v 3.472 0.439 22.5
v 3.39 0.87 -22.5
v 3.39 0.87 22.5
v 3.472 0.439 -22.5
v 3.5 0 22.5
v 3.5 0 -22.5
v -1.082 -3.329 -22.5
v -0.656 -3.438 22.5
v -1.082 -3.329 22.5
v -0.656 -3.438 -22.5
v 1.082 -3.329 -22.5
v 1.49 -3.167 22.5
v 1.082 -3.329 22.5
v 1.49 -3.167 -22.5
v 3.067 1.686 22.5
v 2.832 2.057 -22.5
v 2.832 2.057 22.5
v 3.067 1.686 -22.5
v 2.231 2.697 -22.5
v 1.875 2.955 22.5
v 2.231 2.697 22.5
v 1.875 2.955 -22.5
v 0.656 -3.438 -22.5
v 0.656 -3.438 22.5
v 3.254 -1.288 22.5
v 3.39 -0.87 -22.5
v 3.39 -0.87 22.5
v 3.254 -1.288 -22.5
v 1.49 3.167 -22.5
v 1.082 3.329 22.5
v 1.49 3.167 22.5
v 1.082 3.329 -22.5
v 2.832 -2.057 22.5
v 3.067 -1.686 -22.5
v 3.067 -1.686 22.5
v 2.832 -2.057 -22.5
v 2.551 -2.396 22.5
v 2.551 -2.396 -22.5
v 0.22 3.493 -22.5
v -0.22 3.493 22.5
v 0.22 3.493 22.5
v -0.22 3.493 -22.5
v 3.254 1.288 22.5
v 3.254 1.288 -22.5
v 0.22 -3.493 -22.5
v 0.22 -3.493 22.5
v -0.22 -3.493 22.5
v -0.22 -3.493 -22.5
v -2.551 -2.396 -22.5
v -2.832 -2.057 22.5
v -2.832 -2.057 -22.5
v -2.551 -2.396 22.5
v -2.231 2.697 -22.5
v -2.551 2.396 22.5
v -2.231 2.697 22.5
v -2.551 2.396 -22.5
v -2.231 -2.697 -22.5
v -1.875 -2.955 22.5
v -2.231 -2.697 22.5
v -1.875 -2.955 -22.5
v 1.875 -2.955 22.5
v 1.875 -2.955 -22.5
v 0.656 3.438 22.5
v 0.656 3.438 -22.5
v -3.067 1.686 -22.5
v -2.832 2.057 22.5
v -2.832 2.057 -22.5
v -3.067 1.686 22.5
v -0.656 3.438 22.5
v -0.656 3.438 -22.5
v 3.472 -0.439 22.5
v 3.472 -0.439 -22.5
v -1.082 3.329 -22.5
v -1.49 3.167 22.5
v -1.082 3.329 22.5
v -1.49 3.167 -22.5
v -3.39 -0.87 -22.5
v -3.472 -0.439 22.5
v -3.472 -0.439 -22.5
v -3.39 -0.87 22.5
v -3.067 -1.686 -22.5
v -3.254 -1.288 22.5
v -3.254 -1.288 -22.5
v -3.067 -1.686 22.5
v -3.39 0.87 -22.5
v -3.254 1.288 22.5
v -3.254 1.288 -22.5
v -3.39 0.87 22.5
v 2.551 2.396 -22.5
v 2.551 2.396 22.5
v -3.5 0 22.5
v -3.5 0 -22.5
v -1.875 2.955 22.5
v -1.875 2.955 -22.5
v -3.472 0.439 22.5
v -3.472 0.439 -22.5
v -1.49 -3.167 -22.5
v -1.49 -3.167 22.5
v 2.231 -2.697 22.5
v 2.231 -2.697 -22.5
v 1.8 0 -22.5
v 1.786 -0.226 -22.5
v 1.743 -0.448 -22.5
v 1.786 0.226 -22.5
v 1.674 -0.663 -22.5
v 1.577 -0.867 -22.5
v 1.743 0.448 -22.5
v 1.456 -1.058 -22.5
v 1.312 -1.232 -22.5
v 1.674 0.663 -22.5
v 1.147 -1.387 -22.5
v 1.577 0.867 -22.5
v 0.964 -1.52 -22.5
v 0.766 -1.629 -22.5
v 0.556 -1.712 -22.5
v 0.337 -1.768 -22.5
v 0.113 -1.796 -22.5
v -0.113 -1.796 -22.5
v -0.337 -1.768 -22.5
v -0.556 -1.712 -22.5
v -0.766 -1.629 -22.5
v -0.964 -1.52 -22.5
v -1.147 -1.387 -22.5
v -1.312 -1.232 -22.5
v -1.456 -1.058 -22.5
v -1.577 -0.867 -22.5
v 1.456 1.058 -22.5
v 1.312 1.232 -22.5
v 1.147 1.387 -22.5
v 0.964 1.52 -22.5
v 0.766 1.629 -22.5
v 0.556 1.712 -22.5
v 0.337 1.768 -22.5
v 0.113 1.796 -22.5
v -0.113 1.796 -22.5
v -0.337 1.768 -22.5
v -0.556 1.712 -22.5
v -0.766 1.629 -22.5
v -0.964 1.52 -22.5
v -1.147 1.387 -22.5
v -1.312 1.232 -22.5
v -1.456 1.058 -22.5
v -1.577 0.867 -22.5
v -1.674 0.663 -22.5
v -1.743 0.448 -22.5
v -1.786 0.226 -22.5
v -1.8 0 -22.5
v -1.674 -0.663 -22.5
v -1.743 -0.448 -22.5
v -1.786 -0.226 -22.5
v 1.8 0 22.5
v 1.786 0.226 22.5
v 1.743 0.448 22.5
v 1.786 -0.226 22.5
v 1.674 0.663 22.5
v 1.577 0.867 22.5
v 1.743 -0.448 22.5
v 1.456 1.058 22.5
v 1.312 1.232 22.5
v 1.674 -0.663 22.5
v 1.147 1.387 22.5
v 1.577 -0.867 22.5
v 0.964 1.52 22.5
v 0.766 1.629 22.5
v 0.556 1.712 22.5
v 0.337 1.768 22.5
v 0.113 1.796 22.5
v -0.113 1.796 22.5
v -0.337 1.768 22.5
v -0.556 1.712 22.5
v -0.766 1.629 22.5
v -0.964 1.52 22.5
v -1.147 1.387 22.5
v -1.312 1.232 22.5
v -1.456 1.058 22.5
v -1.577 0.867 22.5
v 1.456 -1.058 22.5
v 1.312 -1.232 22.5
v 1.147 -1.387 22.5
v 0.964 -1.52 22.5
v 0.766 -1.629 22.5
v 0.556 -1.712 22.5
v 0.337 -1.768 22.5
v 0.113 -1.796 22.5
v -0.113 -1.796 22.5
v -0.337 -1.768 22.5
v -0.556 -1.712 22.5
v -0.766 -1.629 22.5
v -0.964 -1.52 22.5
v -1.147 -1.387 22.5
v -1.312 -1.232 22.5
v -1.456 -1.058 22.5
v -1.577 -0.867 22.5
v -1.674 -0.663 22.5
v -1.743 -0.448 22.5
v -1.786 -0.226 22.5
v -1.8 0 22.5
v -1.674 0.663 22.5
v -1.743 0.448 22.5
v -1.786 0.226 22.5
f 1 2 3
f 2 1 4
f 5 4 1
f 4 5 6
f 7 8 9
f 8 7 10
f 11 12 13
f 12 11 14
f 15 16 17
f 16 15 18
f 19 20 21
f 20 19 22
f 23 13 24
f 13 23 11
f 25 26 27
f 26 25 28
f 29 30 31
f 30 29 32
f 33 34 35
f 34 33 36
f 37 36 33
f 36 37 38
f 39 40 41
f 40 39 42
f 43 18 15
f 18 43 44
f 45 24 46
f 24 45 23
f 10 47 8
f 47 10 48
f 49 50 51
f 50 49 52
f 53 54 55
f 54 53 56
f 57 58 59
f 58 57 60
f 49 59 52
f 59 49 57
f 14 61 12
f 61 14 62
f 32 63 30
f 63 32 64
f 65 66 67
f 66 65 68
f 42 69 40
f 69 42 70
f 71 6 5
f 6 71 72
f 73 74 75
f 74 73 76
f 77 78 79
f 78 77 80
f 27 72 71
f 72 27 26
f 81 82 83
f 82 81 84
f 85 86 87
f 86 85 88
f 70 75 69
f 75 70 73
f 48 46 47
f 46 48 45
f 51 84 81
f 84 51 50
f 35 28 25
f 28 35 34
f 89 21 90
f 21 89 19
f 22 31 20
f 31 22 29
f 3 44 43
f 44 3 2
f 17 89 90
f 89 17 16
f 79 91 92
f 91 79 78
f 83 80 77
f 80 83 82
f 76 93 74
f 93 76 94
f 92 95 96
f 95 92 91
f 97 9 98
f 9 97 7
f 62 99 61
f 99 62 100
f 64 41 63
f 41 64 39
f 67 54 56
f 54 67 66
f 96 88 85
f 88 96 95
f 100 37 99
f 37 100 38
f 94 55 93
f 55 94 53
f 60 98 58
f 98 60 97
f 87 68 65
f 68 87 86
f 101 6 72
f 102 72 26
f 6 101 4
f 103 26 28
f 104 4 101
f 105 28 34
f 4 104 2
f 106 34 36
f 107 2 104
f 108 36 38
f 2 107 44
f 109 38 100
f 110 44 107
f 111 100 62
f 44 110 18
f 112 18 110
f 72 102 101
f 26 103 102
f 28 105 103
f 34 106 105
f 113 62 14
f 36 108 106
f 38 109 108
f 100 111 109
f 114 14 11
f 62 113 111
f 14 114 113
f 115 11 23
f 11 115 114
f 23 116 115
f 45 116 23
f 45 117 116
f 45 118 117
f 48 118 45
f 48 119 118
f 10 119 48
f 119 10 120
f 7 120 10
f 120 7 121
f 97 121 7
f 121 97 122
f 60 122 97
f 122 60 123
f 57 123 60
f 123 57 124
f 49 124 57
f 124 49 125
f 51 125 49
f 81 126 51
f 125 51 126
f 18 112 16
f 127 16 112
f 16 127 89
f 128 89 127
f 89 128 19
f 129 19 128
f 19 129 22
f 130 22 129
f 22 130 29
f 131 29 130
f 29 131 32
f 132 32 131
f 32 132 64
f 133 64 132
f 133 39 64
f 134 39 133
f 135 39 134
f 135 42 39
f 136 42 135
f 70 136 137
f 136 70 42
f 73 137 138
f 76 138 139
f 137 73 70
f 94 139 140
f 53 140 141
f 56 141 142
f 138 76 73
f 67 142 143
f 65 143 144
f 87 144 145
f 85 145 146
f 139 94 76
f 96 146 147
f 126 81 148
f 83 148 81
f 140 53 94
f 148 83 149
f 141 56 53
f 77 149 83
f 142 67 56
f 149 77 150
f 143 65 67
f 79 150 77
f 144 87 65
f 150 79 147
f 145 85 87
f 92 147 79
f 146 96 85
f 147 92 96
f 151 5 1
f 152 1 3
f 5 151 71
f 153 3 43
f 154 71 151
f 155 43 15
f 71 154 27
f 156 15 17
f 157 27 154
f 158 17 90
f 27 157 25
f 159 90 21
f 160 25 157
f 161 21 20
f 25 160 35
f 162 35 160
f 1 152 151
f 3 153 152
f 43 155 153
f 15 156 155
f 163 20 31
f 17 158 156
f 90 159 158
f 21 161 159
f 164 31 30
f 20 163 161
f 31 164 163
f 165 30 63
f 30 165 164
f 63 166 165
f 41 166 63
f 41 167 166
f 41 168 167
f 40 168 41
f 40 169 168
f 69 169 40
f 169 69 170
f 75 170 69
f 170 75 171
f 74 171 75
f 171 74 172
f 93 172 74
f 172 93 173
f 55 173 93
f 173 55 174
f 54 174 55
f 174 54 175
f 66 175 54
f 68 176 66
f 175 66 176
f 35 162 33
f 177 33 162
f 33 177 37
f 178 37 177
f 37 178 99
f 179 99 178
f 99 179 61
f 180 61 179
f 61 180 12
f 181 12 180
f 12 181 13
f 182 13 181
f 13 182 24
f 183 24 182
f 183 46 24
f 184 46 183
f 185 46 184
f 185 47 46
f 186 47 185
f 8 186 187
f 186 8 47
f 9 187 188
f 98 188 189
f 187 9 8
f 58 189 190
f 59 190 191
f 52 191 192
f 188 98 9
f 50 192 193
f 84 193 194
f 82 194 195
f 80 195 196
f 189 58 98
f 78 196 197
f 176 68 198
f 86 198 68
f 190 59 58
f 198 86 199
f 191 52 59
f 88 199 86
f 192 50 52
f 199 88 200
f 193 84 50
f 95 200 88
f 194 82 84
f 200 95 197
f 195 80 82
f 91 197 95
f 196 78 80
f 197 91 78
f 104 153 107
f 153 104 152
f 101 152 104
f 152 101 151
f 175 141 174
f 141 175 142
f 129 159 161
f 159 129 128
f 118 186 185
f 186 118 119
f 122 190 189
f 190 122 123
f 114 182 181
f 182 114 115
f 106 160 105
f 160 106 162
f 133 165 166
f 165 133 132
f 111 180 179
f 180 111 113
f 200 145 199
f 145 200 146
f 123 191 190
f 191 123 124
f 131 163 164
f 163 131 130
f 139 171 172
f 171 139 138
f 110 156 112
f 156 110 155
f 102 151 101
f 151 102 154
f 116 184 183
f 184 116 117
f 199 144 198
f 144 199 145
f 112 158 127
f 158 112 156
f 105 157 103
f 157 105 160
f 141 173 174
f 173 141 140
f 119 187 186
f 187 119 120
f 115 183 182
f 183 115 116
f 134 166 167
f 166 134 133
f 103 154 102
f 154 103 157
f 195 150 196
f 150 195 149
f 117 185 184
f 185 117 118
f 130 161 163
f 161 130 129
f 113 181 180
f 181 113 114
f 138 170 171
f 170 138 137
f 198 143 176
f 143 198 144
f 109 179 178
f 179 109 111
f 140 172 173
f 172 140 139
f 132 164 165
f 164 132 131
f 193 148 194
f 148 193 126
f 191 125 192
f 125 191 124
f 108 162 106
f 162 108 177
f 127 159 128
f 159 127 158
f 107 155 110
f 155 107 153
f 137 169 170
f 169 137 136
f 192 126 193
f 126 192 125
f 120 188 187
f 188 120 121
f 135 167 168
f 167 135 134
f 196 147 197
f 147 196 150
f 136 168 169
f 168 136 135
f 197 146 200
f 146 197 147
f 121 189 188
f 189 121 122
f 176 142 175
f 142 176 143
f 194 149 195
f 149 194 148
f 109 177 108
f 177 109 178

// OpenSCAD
$fn = 50;


difference() {
	union() {
		translate(v = [0, 0, -22.5000000000]) {
			cylinder(h = 45, r = 3.5000000000);
		}
	}
	union() {
		#translate(v = [0, 0, -100.0000000000]) {
			cylinder(h = 200, r = 1.8000000000);
		}
	}
}
